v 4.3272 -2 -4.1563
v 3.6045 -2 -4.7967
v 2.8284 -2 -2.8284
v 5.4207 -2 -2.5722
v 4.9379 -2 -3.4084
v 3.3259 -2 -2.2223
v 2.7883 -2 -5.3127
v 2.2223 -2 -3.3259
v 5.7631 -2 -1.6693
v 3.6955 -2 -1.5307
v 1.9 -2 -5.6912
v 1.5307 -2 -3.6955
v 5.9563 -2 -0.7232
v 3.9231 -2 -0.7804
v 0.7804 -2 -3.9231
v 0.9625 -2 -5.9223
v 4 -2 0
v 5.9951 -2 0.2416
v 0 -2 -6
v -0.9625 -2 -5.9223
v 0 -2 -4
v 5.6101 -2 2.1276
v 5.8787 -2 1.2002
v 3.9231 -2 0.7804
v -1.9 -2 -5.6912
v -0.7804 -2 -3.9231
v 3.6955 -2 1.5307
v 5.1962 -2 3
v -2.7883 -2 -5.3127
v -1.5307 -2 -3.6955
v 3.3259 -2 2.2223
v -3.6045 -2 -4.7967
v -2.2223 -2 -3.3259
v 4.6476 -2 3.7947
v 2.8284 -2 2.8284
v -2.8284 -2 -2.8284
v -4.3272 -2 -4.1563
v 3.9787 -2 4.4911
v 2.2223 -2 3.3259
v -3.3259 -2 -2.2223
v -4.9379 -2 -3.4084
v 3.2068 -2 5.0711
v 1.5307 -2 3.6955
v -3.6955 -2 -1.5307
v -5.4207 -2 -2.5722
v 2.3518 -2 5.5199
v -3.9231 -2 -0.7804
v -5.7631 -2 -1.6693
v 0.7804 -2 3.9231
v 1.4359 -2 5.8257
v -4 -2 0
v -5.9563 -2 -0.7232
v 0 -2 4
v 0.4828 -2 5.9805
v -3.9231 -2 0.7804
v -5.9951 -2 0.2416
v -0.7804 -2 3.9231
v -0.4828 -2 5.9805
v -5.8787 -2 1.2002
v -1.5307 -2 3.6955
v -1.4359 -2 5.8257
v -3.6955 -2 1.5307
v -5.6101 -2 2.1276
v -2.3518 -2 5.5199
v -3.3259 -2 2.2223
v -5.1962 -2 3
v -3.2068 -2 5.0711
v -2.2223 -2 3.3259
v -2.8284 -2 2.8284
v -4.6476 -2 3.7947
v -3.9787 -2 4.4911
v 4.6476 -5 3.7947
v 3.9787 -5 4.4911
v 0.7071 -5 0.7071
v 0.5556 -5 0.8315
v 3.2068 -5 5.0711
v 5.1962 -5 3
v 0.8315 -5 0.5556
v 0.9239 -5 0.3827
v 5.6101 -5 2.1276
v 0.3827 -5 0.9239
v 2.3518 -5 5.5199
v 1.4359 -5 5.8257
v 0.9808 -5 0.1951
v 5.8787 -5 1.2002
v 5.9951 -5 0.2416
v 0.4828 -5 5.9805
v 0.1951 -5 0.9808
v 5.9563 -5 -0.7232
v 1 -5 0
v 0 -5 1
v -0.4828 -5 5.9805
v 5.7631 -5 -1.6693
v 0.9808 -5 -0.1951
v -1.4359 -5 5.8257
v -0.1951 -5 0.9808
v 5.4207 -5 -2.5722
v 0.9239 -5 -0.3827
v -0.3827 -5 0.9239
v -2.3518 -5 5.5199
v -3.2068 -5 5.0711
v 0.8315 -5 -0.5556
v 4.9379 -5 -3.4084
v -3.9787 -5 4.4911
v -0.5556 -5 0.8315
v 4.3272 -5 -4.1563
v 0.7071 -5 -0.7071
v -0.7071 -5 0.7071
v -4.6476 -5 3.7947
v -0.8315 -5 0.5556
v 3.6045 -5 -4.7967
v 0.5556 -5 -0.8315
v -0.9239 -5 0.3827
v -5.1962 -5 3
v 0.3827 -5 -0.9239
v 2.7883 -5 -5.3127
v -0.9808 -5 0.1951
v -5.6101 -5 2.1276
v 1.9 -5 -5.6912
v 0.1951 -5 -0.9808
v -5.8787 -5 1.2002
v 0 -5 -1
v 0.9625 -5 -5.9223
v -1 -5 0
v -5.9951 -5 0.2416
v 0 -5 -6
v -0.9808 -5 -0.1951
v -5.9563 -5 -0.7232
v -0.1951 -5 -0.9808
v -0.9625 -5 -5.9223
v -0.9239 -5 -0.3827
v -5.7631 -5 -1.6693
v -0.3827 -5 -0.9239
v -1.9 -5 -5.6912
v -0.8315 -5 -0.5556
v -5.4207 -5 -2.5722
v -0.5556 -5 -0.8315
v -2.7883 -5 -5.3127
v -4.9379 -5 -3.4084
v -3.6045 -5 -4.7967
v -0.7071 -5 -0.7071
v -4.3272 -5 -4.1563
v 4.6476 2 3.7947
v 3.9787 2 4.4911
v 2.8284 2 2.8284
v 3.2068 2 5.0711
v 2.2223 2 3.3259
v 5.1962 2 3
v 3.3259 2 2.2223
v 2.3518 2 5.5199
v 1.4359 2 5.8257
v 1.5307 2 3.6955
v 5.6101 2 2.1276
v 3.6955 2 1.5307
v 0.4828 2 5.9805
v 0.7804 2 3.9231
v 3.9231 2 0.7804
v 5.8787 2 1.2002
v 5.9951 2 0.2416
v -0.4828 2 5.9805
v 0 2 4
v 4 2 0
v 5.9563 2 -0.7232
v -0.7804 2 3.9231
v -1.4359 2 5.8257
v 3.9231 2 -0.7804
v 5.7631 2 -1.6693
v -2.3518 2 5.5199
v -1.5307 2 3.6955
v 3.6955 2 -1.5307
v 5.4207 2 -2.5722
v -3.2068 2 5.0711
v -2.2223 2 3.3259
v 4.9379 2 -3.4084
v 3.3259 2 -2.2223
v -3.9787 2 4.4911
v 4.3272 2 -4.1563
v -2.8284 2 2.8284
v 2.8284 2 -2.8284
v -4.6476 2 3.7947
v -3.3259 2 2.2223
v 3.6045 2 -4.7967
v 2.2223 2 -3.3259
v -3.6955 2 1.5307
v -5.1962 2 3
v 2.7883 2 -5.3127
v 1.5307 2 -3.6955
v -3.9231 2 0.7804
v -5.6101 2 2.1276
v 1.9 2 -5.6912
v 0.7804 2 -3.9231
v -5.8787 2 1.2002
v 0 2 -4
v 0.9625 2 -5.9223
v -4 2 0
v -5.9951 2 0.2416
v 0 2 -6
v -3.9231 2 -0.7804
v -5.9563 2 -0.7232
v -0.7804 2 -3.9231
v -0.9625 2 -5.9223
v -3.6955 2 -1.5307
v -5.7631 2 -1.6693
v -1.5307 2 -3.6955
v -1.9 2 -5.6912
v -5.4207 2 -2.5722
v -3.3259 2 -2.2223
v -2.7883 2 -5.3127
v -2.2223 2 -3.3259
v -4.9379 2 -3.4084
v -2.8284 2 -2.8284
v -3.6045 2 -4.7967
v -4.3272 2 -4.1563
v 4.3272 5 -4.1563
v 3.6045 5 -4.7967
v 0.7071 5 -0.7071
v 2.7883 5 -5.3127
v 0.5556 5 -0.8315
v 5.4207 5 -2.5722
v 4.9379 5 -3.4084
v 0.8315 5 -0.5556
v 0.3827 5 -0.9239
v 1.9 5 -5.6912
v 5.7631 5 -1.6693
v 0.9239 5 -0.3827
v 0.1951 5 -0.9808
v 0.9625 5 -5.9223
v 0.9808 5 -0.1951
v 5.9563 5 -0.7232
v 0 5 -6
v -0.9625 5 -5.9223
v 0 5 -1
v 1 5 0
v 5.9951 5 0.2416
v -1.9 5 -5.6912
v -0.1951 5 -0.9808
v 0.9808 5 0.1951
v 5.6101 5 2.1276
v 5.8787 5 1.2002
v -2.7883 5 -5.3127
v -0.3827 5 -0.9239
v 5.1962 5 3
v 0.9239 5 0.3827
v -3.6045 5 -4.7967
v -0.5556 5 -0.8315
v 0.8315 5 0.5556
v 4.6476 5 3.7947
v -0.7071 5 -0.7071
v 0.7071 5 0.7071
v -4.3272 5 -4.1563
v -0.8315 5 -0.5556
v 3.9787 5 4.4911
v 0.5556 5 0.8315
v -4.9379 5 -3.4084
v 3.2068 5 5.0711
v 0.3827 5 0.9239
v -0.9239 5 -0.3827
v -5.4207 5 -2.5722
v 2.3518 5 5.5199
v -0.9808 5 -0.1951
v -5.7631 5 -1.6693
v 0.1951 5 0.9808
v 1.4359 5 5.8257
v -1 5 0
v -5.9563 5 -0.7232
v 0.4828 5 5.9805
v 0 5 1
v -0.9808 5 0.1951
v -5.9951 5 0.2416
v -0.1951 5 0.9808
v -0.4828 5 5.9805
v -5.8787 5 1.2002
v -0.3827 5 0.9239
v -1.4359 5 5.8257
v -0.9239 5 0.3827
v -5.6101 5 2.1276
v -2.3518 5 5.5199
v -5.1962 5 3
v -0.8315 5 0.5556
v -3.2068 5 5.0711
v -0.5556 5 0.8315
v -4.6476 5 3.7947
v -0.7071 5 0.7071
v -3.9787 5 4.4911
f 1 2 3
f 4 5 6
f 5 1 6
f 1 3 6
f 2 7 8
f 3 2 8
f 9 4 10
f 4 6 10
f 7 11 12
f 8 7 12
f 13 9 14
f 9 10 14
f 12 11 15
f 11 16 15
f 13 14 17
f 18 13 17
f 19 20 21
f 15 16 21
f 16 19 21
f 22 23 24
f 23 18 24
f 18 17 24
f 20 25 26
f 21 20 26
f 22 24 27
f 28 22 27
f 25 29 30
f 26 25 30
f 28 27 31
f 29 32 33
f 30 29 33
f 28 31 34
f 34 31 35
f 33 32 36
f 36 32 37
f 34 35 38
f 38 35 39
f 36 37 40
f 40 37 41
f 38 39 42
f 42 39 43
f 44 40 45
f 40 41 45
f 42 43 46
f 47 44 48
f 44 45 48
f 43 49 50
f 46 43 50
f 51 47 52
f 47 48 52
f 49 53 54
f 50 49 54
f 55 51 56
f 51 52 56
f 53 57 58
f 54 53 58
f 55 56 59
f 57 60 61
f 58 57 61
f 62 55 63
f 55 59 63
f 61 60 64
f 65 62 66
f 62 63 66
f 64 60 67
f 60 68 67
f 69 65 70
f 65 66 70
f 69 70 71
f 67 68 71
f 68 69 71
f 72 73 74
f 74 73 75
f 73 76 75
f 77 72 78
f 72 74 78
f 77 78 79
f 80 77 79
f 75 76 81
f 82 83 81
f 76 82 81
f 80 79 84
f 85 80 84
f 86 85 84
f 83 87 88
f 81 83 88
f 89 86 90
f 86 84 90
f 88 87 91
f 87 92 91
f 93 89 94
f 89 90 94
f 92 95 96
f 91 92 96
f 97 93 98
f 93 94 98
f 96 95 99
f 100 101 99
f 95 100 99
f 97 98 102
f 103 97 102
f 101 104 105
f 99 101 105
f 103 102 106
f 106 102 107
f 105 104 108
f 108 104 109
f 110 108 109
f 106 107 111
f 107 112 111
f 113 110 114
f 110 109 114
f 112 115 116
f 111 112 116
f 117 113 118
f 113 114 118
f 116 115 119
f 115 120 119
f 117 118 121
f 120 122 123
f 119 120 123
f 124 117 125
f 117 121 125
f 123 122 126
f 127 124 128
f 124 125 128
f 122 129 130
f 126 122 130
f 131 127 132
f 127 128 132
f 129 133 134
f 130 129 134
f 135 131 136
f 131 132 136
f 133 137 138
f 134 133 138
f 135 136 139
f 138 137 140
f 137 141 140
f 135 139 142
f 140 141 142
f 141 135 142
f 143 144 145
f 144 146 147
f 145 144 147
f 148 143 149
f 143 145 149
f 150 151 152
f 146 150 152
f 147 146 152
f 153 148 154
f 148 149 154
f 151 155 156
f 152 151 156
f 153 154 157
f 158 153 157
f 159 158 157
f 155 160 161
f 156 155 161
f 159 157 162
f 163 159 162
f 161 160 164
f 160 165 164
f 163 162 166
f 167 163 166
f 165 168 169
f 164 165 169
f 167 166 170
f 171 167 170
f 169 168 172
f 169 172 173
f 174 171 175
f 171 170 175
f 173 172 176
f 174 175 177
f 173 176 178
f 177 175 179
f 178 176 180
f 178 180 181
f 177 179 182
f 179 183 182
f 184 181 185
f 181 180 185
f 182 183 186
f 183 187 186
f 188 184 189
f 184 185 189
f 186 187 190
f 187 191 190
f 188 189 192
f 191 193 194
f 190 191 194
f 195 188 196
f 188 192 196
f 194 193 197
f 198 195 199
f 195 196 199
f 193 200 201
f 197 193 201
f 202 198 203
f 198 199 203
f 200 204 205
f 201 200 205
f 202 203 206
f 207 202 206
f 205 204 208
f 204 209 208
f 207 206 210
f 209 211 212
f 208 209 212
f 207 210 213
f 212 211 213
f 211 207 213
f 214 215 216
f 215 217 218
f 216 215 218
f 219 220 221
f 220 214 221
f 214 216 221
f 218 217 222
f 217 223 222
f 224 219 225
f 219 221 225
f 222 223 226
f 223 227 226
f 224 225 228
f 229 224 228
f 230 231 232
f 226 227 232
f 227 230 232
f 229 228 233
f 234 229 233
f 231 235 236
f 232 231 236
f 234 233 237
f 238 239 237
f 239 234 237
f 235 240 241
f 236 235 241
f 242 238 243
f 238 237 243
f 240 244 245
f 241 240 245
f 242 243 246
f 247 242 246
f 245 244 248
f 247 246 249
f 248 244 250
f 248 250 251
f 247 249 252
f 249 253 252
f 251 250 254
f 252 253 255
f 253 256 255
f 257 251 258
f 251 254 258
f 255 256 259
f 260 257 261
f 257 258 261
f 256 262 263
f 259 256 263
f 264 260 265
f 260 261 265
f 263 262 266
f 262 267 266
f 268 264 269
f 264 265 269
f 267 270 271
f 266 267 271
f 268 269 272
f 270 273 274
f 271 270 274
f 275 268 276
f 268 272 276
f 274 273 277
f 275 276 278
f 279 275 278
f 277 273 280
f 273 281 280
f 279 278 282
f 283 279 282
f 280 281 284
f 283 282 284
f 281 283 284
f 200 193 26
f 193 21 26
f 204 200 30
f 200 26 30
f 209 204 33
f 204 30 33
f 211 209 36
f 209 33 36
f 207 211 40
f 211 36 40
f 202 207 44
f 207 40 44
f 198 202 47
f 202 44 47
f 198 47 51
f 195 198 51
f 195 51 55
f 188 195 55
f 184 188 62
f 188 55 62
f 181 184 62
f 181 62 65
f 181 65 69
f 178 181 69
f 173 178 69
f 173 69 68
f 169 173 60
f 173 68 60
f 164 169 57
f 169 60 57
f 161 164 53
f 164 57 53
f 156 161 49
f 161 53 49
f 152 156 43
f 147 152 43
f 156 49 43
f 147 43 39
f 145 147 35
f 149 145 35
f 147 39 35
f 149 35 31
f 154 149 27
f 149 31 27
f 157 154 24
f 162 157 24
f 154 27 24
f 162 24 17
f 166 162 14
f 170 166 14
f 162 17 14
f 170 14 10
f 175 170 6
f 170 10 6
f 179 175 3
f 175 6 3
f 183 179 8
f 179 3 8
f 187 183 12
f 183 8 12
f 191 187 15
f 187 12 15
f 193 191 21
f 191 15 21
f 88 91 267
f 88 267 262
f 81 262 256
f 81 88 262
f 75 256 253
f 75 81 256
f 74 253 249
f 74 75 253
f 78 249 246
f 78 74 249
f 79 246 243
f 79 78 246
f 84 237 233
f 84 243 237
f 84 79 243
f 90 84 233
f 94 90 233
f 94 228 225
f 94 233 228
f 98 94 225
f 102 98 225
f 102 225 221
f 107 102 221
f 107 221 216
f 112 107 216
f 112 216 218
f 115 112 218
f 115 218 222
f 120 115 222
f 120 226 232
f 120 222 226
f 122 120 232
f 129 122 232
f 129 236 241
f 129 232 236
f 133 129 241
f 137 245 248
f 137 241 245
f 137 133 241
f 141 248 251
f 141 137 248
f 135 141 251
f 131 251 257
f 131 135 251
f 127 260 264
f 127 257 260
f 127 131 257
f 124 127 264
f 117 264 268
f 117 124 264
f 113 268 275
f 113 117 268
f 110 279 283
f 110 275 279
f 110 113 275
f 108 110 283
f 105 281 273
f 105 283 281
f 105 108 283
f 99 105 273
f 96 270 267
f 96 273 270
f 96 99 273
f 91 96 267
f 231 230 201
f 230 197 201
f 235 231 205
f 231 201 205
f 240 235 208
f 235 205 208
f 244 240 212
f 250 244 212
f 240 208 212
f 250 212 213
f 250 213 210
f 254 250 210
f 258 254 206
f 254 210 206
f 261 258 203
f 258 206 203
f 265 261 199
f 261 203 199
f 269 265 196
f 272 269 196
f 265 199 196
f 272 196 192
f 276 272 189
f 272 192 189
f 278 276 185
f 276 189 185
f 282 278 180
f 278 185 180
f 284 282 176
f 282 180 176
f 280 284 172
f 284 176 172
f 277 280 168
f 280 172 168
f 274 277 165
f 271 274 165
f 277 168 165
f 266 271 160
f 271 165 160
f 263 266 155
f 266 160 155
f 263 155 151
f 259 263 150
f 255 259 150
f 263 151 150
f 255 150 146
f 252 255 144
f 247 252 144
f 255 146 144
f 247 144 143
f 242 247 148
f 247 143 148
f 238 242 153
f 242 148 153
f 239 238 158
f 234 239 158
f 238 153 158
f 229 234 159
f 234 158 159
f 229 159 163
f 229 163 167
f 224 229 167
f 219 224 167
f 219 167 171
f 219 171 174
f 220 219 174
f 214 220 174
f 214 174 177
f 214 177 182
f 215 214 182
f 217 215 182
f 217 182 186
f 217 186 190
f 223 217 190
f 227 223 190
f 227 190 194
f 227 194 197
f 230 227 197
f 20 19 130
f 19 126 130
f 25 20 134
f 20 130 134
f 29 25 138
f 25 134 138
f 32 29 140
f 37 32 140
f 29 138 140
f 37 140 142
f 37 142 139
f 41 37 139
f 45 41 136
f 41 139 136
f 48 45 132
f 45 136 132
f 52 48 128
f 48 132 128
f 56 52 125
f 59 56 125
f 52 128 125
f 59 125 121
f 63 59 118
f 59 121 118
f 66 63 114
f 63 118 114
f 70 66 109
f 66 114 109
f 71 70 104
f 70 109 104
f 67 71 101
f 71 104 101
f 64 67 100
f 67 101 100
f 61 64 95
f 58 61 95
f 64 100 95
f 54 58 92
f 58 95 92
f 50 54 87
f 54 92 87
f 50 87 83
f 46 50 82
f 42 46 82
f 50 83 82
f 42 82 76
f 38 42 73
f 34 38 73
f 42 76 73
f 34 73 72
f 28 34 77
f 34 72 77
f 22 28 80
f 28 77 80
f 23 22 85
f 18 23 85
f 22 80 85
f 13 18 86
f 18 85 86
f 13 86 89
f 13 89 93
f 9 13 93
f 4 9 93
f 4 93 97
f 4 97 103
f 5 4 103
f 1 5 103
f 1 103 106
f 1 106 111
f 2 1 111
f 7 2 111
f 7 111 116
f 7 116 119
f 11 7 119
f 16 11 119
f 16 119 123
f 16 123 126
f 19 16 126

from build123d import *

# Parameters (mm, degrees)
CORTAR_EXTRUIR1_DEPTH      = 41.890096601
CORTAR_EXTRUIR1_DEPTH_BACK = 41.890096601
CROQUIS2_R                 = 0.5
CORTAR_EXTRUIR2_DEPTH      = 27.400757565
CORTAR_EXTRUIR2_DEPTH_BACK = 27.400757565
CROQUIS3_R                 = 1


with BuildPart() as part:
    # Croquis1 → Revolución1 (revolve)
    with BuildSketch(Plane.XY, mode=Mode.PRIVATE) as revoluci_n1_sk:
        Polygon((0.9, 20), (0.9, 5), (6, 5), (6, 2), (4, 2), (4, -2), (6, -2), (6, -5), (0.9, -5), (0.9, -20), (0, -20), (0, 20), align=None)
    revolve(revoluci_n1_sk.sketch.rotate(Axis((0, 0, 0), (0, 1, 0)), 90), axis=Axis((0, 0, 0), (0, 1, 0)))

    # Croquis2 → Cortar-Extruir1 (cut, two sides: drawn at the far end of the back side and taken through both)
    with BuildSketch(Plane(origin=(0, 20, 0), x_dir=(1, 0, 0), z_dir=(0, 1, 0)).offset(-CORTAR_EXTRUIR1_DEPTH_BACK)):
        with Locations(Location((0, 0, 0), (0, 0, 270))):
            Circle(CROQUIS2_R)
    extrude(amount=CORTAR_EXTRUIR1_DEPTH + CORTAR_EXTRUIR1_DEPTH_BACK, mode=Mode.SUBTRACT)

    # Croquis3 → Cortar-Extruir2 (cut, two sides: drawn at the far end of the back side and taken through both)
    with BuildSketch(Plane(origin=(0, 5, 0), x_dir=(1, 0, 0), z_dir=(0, 1, 0)).offset(-CORTAR_EXTRUIR2_DEPTH_BACK)):
        with Locations(Location((0, 0, 0), (0, 0, 270))):
            Circle(CROQUIS3_R)
    extrude(amount=CORTAR_EXTRUIR2_DEPTH + CORTAR_EXTRUIR2_DEPTH_BACK, mode=Mode.SUBTRACT)


solid = part.part
